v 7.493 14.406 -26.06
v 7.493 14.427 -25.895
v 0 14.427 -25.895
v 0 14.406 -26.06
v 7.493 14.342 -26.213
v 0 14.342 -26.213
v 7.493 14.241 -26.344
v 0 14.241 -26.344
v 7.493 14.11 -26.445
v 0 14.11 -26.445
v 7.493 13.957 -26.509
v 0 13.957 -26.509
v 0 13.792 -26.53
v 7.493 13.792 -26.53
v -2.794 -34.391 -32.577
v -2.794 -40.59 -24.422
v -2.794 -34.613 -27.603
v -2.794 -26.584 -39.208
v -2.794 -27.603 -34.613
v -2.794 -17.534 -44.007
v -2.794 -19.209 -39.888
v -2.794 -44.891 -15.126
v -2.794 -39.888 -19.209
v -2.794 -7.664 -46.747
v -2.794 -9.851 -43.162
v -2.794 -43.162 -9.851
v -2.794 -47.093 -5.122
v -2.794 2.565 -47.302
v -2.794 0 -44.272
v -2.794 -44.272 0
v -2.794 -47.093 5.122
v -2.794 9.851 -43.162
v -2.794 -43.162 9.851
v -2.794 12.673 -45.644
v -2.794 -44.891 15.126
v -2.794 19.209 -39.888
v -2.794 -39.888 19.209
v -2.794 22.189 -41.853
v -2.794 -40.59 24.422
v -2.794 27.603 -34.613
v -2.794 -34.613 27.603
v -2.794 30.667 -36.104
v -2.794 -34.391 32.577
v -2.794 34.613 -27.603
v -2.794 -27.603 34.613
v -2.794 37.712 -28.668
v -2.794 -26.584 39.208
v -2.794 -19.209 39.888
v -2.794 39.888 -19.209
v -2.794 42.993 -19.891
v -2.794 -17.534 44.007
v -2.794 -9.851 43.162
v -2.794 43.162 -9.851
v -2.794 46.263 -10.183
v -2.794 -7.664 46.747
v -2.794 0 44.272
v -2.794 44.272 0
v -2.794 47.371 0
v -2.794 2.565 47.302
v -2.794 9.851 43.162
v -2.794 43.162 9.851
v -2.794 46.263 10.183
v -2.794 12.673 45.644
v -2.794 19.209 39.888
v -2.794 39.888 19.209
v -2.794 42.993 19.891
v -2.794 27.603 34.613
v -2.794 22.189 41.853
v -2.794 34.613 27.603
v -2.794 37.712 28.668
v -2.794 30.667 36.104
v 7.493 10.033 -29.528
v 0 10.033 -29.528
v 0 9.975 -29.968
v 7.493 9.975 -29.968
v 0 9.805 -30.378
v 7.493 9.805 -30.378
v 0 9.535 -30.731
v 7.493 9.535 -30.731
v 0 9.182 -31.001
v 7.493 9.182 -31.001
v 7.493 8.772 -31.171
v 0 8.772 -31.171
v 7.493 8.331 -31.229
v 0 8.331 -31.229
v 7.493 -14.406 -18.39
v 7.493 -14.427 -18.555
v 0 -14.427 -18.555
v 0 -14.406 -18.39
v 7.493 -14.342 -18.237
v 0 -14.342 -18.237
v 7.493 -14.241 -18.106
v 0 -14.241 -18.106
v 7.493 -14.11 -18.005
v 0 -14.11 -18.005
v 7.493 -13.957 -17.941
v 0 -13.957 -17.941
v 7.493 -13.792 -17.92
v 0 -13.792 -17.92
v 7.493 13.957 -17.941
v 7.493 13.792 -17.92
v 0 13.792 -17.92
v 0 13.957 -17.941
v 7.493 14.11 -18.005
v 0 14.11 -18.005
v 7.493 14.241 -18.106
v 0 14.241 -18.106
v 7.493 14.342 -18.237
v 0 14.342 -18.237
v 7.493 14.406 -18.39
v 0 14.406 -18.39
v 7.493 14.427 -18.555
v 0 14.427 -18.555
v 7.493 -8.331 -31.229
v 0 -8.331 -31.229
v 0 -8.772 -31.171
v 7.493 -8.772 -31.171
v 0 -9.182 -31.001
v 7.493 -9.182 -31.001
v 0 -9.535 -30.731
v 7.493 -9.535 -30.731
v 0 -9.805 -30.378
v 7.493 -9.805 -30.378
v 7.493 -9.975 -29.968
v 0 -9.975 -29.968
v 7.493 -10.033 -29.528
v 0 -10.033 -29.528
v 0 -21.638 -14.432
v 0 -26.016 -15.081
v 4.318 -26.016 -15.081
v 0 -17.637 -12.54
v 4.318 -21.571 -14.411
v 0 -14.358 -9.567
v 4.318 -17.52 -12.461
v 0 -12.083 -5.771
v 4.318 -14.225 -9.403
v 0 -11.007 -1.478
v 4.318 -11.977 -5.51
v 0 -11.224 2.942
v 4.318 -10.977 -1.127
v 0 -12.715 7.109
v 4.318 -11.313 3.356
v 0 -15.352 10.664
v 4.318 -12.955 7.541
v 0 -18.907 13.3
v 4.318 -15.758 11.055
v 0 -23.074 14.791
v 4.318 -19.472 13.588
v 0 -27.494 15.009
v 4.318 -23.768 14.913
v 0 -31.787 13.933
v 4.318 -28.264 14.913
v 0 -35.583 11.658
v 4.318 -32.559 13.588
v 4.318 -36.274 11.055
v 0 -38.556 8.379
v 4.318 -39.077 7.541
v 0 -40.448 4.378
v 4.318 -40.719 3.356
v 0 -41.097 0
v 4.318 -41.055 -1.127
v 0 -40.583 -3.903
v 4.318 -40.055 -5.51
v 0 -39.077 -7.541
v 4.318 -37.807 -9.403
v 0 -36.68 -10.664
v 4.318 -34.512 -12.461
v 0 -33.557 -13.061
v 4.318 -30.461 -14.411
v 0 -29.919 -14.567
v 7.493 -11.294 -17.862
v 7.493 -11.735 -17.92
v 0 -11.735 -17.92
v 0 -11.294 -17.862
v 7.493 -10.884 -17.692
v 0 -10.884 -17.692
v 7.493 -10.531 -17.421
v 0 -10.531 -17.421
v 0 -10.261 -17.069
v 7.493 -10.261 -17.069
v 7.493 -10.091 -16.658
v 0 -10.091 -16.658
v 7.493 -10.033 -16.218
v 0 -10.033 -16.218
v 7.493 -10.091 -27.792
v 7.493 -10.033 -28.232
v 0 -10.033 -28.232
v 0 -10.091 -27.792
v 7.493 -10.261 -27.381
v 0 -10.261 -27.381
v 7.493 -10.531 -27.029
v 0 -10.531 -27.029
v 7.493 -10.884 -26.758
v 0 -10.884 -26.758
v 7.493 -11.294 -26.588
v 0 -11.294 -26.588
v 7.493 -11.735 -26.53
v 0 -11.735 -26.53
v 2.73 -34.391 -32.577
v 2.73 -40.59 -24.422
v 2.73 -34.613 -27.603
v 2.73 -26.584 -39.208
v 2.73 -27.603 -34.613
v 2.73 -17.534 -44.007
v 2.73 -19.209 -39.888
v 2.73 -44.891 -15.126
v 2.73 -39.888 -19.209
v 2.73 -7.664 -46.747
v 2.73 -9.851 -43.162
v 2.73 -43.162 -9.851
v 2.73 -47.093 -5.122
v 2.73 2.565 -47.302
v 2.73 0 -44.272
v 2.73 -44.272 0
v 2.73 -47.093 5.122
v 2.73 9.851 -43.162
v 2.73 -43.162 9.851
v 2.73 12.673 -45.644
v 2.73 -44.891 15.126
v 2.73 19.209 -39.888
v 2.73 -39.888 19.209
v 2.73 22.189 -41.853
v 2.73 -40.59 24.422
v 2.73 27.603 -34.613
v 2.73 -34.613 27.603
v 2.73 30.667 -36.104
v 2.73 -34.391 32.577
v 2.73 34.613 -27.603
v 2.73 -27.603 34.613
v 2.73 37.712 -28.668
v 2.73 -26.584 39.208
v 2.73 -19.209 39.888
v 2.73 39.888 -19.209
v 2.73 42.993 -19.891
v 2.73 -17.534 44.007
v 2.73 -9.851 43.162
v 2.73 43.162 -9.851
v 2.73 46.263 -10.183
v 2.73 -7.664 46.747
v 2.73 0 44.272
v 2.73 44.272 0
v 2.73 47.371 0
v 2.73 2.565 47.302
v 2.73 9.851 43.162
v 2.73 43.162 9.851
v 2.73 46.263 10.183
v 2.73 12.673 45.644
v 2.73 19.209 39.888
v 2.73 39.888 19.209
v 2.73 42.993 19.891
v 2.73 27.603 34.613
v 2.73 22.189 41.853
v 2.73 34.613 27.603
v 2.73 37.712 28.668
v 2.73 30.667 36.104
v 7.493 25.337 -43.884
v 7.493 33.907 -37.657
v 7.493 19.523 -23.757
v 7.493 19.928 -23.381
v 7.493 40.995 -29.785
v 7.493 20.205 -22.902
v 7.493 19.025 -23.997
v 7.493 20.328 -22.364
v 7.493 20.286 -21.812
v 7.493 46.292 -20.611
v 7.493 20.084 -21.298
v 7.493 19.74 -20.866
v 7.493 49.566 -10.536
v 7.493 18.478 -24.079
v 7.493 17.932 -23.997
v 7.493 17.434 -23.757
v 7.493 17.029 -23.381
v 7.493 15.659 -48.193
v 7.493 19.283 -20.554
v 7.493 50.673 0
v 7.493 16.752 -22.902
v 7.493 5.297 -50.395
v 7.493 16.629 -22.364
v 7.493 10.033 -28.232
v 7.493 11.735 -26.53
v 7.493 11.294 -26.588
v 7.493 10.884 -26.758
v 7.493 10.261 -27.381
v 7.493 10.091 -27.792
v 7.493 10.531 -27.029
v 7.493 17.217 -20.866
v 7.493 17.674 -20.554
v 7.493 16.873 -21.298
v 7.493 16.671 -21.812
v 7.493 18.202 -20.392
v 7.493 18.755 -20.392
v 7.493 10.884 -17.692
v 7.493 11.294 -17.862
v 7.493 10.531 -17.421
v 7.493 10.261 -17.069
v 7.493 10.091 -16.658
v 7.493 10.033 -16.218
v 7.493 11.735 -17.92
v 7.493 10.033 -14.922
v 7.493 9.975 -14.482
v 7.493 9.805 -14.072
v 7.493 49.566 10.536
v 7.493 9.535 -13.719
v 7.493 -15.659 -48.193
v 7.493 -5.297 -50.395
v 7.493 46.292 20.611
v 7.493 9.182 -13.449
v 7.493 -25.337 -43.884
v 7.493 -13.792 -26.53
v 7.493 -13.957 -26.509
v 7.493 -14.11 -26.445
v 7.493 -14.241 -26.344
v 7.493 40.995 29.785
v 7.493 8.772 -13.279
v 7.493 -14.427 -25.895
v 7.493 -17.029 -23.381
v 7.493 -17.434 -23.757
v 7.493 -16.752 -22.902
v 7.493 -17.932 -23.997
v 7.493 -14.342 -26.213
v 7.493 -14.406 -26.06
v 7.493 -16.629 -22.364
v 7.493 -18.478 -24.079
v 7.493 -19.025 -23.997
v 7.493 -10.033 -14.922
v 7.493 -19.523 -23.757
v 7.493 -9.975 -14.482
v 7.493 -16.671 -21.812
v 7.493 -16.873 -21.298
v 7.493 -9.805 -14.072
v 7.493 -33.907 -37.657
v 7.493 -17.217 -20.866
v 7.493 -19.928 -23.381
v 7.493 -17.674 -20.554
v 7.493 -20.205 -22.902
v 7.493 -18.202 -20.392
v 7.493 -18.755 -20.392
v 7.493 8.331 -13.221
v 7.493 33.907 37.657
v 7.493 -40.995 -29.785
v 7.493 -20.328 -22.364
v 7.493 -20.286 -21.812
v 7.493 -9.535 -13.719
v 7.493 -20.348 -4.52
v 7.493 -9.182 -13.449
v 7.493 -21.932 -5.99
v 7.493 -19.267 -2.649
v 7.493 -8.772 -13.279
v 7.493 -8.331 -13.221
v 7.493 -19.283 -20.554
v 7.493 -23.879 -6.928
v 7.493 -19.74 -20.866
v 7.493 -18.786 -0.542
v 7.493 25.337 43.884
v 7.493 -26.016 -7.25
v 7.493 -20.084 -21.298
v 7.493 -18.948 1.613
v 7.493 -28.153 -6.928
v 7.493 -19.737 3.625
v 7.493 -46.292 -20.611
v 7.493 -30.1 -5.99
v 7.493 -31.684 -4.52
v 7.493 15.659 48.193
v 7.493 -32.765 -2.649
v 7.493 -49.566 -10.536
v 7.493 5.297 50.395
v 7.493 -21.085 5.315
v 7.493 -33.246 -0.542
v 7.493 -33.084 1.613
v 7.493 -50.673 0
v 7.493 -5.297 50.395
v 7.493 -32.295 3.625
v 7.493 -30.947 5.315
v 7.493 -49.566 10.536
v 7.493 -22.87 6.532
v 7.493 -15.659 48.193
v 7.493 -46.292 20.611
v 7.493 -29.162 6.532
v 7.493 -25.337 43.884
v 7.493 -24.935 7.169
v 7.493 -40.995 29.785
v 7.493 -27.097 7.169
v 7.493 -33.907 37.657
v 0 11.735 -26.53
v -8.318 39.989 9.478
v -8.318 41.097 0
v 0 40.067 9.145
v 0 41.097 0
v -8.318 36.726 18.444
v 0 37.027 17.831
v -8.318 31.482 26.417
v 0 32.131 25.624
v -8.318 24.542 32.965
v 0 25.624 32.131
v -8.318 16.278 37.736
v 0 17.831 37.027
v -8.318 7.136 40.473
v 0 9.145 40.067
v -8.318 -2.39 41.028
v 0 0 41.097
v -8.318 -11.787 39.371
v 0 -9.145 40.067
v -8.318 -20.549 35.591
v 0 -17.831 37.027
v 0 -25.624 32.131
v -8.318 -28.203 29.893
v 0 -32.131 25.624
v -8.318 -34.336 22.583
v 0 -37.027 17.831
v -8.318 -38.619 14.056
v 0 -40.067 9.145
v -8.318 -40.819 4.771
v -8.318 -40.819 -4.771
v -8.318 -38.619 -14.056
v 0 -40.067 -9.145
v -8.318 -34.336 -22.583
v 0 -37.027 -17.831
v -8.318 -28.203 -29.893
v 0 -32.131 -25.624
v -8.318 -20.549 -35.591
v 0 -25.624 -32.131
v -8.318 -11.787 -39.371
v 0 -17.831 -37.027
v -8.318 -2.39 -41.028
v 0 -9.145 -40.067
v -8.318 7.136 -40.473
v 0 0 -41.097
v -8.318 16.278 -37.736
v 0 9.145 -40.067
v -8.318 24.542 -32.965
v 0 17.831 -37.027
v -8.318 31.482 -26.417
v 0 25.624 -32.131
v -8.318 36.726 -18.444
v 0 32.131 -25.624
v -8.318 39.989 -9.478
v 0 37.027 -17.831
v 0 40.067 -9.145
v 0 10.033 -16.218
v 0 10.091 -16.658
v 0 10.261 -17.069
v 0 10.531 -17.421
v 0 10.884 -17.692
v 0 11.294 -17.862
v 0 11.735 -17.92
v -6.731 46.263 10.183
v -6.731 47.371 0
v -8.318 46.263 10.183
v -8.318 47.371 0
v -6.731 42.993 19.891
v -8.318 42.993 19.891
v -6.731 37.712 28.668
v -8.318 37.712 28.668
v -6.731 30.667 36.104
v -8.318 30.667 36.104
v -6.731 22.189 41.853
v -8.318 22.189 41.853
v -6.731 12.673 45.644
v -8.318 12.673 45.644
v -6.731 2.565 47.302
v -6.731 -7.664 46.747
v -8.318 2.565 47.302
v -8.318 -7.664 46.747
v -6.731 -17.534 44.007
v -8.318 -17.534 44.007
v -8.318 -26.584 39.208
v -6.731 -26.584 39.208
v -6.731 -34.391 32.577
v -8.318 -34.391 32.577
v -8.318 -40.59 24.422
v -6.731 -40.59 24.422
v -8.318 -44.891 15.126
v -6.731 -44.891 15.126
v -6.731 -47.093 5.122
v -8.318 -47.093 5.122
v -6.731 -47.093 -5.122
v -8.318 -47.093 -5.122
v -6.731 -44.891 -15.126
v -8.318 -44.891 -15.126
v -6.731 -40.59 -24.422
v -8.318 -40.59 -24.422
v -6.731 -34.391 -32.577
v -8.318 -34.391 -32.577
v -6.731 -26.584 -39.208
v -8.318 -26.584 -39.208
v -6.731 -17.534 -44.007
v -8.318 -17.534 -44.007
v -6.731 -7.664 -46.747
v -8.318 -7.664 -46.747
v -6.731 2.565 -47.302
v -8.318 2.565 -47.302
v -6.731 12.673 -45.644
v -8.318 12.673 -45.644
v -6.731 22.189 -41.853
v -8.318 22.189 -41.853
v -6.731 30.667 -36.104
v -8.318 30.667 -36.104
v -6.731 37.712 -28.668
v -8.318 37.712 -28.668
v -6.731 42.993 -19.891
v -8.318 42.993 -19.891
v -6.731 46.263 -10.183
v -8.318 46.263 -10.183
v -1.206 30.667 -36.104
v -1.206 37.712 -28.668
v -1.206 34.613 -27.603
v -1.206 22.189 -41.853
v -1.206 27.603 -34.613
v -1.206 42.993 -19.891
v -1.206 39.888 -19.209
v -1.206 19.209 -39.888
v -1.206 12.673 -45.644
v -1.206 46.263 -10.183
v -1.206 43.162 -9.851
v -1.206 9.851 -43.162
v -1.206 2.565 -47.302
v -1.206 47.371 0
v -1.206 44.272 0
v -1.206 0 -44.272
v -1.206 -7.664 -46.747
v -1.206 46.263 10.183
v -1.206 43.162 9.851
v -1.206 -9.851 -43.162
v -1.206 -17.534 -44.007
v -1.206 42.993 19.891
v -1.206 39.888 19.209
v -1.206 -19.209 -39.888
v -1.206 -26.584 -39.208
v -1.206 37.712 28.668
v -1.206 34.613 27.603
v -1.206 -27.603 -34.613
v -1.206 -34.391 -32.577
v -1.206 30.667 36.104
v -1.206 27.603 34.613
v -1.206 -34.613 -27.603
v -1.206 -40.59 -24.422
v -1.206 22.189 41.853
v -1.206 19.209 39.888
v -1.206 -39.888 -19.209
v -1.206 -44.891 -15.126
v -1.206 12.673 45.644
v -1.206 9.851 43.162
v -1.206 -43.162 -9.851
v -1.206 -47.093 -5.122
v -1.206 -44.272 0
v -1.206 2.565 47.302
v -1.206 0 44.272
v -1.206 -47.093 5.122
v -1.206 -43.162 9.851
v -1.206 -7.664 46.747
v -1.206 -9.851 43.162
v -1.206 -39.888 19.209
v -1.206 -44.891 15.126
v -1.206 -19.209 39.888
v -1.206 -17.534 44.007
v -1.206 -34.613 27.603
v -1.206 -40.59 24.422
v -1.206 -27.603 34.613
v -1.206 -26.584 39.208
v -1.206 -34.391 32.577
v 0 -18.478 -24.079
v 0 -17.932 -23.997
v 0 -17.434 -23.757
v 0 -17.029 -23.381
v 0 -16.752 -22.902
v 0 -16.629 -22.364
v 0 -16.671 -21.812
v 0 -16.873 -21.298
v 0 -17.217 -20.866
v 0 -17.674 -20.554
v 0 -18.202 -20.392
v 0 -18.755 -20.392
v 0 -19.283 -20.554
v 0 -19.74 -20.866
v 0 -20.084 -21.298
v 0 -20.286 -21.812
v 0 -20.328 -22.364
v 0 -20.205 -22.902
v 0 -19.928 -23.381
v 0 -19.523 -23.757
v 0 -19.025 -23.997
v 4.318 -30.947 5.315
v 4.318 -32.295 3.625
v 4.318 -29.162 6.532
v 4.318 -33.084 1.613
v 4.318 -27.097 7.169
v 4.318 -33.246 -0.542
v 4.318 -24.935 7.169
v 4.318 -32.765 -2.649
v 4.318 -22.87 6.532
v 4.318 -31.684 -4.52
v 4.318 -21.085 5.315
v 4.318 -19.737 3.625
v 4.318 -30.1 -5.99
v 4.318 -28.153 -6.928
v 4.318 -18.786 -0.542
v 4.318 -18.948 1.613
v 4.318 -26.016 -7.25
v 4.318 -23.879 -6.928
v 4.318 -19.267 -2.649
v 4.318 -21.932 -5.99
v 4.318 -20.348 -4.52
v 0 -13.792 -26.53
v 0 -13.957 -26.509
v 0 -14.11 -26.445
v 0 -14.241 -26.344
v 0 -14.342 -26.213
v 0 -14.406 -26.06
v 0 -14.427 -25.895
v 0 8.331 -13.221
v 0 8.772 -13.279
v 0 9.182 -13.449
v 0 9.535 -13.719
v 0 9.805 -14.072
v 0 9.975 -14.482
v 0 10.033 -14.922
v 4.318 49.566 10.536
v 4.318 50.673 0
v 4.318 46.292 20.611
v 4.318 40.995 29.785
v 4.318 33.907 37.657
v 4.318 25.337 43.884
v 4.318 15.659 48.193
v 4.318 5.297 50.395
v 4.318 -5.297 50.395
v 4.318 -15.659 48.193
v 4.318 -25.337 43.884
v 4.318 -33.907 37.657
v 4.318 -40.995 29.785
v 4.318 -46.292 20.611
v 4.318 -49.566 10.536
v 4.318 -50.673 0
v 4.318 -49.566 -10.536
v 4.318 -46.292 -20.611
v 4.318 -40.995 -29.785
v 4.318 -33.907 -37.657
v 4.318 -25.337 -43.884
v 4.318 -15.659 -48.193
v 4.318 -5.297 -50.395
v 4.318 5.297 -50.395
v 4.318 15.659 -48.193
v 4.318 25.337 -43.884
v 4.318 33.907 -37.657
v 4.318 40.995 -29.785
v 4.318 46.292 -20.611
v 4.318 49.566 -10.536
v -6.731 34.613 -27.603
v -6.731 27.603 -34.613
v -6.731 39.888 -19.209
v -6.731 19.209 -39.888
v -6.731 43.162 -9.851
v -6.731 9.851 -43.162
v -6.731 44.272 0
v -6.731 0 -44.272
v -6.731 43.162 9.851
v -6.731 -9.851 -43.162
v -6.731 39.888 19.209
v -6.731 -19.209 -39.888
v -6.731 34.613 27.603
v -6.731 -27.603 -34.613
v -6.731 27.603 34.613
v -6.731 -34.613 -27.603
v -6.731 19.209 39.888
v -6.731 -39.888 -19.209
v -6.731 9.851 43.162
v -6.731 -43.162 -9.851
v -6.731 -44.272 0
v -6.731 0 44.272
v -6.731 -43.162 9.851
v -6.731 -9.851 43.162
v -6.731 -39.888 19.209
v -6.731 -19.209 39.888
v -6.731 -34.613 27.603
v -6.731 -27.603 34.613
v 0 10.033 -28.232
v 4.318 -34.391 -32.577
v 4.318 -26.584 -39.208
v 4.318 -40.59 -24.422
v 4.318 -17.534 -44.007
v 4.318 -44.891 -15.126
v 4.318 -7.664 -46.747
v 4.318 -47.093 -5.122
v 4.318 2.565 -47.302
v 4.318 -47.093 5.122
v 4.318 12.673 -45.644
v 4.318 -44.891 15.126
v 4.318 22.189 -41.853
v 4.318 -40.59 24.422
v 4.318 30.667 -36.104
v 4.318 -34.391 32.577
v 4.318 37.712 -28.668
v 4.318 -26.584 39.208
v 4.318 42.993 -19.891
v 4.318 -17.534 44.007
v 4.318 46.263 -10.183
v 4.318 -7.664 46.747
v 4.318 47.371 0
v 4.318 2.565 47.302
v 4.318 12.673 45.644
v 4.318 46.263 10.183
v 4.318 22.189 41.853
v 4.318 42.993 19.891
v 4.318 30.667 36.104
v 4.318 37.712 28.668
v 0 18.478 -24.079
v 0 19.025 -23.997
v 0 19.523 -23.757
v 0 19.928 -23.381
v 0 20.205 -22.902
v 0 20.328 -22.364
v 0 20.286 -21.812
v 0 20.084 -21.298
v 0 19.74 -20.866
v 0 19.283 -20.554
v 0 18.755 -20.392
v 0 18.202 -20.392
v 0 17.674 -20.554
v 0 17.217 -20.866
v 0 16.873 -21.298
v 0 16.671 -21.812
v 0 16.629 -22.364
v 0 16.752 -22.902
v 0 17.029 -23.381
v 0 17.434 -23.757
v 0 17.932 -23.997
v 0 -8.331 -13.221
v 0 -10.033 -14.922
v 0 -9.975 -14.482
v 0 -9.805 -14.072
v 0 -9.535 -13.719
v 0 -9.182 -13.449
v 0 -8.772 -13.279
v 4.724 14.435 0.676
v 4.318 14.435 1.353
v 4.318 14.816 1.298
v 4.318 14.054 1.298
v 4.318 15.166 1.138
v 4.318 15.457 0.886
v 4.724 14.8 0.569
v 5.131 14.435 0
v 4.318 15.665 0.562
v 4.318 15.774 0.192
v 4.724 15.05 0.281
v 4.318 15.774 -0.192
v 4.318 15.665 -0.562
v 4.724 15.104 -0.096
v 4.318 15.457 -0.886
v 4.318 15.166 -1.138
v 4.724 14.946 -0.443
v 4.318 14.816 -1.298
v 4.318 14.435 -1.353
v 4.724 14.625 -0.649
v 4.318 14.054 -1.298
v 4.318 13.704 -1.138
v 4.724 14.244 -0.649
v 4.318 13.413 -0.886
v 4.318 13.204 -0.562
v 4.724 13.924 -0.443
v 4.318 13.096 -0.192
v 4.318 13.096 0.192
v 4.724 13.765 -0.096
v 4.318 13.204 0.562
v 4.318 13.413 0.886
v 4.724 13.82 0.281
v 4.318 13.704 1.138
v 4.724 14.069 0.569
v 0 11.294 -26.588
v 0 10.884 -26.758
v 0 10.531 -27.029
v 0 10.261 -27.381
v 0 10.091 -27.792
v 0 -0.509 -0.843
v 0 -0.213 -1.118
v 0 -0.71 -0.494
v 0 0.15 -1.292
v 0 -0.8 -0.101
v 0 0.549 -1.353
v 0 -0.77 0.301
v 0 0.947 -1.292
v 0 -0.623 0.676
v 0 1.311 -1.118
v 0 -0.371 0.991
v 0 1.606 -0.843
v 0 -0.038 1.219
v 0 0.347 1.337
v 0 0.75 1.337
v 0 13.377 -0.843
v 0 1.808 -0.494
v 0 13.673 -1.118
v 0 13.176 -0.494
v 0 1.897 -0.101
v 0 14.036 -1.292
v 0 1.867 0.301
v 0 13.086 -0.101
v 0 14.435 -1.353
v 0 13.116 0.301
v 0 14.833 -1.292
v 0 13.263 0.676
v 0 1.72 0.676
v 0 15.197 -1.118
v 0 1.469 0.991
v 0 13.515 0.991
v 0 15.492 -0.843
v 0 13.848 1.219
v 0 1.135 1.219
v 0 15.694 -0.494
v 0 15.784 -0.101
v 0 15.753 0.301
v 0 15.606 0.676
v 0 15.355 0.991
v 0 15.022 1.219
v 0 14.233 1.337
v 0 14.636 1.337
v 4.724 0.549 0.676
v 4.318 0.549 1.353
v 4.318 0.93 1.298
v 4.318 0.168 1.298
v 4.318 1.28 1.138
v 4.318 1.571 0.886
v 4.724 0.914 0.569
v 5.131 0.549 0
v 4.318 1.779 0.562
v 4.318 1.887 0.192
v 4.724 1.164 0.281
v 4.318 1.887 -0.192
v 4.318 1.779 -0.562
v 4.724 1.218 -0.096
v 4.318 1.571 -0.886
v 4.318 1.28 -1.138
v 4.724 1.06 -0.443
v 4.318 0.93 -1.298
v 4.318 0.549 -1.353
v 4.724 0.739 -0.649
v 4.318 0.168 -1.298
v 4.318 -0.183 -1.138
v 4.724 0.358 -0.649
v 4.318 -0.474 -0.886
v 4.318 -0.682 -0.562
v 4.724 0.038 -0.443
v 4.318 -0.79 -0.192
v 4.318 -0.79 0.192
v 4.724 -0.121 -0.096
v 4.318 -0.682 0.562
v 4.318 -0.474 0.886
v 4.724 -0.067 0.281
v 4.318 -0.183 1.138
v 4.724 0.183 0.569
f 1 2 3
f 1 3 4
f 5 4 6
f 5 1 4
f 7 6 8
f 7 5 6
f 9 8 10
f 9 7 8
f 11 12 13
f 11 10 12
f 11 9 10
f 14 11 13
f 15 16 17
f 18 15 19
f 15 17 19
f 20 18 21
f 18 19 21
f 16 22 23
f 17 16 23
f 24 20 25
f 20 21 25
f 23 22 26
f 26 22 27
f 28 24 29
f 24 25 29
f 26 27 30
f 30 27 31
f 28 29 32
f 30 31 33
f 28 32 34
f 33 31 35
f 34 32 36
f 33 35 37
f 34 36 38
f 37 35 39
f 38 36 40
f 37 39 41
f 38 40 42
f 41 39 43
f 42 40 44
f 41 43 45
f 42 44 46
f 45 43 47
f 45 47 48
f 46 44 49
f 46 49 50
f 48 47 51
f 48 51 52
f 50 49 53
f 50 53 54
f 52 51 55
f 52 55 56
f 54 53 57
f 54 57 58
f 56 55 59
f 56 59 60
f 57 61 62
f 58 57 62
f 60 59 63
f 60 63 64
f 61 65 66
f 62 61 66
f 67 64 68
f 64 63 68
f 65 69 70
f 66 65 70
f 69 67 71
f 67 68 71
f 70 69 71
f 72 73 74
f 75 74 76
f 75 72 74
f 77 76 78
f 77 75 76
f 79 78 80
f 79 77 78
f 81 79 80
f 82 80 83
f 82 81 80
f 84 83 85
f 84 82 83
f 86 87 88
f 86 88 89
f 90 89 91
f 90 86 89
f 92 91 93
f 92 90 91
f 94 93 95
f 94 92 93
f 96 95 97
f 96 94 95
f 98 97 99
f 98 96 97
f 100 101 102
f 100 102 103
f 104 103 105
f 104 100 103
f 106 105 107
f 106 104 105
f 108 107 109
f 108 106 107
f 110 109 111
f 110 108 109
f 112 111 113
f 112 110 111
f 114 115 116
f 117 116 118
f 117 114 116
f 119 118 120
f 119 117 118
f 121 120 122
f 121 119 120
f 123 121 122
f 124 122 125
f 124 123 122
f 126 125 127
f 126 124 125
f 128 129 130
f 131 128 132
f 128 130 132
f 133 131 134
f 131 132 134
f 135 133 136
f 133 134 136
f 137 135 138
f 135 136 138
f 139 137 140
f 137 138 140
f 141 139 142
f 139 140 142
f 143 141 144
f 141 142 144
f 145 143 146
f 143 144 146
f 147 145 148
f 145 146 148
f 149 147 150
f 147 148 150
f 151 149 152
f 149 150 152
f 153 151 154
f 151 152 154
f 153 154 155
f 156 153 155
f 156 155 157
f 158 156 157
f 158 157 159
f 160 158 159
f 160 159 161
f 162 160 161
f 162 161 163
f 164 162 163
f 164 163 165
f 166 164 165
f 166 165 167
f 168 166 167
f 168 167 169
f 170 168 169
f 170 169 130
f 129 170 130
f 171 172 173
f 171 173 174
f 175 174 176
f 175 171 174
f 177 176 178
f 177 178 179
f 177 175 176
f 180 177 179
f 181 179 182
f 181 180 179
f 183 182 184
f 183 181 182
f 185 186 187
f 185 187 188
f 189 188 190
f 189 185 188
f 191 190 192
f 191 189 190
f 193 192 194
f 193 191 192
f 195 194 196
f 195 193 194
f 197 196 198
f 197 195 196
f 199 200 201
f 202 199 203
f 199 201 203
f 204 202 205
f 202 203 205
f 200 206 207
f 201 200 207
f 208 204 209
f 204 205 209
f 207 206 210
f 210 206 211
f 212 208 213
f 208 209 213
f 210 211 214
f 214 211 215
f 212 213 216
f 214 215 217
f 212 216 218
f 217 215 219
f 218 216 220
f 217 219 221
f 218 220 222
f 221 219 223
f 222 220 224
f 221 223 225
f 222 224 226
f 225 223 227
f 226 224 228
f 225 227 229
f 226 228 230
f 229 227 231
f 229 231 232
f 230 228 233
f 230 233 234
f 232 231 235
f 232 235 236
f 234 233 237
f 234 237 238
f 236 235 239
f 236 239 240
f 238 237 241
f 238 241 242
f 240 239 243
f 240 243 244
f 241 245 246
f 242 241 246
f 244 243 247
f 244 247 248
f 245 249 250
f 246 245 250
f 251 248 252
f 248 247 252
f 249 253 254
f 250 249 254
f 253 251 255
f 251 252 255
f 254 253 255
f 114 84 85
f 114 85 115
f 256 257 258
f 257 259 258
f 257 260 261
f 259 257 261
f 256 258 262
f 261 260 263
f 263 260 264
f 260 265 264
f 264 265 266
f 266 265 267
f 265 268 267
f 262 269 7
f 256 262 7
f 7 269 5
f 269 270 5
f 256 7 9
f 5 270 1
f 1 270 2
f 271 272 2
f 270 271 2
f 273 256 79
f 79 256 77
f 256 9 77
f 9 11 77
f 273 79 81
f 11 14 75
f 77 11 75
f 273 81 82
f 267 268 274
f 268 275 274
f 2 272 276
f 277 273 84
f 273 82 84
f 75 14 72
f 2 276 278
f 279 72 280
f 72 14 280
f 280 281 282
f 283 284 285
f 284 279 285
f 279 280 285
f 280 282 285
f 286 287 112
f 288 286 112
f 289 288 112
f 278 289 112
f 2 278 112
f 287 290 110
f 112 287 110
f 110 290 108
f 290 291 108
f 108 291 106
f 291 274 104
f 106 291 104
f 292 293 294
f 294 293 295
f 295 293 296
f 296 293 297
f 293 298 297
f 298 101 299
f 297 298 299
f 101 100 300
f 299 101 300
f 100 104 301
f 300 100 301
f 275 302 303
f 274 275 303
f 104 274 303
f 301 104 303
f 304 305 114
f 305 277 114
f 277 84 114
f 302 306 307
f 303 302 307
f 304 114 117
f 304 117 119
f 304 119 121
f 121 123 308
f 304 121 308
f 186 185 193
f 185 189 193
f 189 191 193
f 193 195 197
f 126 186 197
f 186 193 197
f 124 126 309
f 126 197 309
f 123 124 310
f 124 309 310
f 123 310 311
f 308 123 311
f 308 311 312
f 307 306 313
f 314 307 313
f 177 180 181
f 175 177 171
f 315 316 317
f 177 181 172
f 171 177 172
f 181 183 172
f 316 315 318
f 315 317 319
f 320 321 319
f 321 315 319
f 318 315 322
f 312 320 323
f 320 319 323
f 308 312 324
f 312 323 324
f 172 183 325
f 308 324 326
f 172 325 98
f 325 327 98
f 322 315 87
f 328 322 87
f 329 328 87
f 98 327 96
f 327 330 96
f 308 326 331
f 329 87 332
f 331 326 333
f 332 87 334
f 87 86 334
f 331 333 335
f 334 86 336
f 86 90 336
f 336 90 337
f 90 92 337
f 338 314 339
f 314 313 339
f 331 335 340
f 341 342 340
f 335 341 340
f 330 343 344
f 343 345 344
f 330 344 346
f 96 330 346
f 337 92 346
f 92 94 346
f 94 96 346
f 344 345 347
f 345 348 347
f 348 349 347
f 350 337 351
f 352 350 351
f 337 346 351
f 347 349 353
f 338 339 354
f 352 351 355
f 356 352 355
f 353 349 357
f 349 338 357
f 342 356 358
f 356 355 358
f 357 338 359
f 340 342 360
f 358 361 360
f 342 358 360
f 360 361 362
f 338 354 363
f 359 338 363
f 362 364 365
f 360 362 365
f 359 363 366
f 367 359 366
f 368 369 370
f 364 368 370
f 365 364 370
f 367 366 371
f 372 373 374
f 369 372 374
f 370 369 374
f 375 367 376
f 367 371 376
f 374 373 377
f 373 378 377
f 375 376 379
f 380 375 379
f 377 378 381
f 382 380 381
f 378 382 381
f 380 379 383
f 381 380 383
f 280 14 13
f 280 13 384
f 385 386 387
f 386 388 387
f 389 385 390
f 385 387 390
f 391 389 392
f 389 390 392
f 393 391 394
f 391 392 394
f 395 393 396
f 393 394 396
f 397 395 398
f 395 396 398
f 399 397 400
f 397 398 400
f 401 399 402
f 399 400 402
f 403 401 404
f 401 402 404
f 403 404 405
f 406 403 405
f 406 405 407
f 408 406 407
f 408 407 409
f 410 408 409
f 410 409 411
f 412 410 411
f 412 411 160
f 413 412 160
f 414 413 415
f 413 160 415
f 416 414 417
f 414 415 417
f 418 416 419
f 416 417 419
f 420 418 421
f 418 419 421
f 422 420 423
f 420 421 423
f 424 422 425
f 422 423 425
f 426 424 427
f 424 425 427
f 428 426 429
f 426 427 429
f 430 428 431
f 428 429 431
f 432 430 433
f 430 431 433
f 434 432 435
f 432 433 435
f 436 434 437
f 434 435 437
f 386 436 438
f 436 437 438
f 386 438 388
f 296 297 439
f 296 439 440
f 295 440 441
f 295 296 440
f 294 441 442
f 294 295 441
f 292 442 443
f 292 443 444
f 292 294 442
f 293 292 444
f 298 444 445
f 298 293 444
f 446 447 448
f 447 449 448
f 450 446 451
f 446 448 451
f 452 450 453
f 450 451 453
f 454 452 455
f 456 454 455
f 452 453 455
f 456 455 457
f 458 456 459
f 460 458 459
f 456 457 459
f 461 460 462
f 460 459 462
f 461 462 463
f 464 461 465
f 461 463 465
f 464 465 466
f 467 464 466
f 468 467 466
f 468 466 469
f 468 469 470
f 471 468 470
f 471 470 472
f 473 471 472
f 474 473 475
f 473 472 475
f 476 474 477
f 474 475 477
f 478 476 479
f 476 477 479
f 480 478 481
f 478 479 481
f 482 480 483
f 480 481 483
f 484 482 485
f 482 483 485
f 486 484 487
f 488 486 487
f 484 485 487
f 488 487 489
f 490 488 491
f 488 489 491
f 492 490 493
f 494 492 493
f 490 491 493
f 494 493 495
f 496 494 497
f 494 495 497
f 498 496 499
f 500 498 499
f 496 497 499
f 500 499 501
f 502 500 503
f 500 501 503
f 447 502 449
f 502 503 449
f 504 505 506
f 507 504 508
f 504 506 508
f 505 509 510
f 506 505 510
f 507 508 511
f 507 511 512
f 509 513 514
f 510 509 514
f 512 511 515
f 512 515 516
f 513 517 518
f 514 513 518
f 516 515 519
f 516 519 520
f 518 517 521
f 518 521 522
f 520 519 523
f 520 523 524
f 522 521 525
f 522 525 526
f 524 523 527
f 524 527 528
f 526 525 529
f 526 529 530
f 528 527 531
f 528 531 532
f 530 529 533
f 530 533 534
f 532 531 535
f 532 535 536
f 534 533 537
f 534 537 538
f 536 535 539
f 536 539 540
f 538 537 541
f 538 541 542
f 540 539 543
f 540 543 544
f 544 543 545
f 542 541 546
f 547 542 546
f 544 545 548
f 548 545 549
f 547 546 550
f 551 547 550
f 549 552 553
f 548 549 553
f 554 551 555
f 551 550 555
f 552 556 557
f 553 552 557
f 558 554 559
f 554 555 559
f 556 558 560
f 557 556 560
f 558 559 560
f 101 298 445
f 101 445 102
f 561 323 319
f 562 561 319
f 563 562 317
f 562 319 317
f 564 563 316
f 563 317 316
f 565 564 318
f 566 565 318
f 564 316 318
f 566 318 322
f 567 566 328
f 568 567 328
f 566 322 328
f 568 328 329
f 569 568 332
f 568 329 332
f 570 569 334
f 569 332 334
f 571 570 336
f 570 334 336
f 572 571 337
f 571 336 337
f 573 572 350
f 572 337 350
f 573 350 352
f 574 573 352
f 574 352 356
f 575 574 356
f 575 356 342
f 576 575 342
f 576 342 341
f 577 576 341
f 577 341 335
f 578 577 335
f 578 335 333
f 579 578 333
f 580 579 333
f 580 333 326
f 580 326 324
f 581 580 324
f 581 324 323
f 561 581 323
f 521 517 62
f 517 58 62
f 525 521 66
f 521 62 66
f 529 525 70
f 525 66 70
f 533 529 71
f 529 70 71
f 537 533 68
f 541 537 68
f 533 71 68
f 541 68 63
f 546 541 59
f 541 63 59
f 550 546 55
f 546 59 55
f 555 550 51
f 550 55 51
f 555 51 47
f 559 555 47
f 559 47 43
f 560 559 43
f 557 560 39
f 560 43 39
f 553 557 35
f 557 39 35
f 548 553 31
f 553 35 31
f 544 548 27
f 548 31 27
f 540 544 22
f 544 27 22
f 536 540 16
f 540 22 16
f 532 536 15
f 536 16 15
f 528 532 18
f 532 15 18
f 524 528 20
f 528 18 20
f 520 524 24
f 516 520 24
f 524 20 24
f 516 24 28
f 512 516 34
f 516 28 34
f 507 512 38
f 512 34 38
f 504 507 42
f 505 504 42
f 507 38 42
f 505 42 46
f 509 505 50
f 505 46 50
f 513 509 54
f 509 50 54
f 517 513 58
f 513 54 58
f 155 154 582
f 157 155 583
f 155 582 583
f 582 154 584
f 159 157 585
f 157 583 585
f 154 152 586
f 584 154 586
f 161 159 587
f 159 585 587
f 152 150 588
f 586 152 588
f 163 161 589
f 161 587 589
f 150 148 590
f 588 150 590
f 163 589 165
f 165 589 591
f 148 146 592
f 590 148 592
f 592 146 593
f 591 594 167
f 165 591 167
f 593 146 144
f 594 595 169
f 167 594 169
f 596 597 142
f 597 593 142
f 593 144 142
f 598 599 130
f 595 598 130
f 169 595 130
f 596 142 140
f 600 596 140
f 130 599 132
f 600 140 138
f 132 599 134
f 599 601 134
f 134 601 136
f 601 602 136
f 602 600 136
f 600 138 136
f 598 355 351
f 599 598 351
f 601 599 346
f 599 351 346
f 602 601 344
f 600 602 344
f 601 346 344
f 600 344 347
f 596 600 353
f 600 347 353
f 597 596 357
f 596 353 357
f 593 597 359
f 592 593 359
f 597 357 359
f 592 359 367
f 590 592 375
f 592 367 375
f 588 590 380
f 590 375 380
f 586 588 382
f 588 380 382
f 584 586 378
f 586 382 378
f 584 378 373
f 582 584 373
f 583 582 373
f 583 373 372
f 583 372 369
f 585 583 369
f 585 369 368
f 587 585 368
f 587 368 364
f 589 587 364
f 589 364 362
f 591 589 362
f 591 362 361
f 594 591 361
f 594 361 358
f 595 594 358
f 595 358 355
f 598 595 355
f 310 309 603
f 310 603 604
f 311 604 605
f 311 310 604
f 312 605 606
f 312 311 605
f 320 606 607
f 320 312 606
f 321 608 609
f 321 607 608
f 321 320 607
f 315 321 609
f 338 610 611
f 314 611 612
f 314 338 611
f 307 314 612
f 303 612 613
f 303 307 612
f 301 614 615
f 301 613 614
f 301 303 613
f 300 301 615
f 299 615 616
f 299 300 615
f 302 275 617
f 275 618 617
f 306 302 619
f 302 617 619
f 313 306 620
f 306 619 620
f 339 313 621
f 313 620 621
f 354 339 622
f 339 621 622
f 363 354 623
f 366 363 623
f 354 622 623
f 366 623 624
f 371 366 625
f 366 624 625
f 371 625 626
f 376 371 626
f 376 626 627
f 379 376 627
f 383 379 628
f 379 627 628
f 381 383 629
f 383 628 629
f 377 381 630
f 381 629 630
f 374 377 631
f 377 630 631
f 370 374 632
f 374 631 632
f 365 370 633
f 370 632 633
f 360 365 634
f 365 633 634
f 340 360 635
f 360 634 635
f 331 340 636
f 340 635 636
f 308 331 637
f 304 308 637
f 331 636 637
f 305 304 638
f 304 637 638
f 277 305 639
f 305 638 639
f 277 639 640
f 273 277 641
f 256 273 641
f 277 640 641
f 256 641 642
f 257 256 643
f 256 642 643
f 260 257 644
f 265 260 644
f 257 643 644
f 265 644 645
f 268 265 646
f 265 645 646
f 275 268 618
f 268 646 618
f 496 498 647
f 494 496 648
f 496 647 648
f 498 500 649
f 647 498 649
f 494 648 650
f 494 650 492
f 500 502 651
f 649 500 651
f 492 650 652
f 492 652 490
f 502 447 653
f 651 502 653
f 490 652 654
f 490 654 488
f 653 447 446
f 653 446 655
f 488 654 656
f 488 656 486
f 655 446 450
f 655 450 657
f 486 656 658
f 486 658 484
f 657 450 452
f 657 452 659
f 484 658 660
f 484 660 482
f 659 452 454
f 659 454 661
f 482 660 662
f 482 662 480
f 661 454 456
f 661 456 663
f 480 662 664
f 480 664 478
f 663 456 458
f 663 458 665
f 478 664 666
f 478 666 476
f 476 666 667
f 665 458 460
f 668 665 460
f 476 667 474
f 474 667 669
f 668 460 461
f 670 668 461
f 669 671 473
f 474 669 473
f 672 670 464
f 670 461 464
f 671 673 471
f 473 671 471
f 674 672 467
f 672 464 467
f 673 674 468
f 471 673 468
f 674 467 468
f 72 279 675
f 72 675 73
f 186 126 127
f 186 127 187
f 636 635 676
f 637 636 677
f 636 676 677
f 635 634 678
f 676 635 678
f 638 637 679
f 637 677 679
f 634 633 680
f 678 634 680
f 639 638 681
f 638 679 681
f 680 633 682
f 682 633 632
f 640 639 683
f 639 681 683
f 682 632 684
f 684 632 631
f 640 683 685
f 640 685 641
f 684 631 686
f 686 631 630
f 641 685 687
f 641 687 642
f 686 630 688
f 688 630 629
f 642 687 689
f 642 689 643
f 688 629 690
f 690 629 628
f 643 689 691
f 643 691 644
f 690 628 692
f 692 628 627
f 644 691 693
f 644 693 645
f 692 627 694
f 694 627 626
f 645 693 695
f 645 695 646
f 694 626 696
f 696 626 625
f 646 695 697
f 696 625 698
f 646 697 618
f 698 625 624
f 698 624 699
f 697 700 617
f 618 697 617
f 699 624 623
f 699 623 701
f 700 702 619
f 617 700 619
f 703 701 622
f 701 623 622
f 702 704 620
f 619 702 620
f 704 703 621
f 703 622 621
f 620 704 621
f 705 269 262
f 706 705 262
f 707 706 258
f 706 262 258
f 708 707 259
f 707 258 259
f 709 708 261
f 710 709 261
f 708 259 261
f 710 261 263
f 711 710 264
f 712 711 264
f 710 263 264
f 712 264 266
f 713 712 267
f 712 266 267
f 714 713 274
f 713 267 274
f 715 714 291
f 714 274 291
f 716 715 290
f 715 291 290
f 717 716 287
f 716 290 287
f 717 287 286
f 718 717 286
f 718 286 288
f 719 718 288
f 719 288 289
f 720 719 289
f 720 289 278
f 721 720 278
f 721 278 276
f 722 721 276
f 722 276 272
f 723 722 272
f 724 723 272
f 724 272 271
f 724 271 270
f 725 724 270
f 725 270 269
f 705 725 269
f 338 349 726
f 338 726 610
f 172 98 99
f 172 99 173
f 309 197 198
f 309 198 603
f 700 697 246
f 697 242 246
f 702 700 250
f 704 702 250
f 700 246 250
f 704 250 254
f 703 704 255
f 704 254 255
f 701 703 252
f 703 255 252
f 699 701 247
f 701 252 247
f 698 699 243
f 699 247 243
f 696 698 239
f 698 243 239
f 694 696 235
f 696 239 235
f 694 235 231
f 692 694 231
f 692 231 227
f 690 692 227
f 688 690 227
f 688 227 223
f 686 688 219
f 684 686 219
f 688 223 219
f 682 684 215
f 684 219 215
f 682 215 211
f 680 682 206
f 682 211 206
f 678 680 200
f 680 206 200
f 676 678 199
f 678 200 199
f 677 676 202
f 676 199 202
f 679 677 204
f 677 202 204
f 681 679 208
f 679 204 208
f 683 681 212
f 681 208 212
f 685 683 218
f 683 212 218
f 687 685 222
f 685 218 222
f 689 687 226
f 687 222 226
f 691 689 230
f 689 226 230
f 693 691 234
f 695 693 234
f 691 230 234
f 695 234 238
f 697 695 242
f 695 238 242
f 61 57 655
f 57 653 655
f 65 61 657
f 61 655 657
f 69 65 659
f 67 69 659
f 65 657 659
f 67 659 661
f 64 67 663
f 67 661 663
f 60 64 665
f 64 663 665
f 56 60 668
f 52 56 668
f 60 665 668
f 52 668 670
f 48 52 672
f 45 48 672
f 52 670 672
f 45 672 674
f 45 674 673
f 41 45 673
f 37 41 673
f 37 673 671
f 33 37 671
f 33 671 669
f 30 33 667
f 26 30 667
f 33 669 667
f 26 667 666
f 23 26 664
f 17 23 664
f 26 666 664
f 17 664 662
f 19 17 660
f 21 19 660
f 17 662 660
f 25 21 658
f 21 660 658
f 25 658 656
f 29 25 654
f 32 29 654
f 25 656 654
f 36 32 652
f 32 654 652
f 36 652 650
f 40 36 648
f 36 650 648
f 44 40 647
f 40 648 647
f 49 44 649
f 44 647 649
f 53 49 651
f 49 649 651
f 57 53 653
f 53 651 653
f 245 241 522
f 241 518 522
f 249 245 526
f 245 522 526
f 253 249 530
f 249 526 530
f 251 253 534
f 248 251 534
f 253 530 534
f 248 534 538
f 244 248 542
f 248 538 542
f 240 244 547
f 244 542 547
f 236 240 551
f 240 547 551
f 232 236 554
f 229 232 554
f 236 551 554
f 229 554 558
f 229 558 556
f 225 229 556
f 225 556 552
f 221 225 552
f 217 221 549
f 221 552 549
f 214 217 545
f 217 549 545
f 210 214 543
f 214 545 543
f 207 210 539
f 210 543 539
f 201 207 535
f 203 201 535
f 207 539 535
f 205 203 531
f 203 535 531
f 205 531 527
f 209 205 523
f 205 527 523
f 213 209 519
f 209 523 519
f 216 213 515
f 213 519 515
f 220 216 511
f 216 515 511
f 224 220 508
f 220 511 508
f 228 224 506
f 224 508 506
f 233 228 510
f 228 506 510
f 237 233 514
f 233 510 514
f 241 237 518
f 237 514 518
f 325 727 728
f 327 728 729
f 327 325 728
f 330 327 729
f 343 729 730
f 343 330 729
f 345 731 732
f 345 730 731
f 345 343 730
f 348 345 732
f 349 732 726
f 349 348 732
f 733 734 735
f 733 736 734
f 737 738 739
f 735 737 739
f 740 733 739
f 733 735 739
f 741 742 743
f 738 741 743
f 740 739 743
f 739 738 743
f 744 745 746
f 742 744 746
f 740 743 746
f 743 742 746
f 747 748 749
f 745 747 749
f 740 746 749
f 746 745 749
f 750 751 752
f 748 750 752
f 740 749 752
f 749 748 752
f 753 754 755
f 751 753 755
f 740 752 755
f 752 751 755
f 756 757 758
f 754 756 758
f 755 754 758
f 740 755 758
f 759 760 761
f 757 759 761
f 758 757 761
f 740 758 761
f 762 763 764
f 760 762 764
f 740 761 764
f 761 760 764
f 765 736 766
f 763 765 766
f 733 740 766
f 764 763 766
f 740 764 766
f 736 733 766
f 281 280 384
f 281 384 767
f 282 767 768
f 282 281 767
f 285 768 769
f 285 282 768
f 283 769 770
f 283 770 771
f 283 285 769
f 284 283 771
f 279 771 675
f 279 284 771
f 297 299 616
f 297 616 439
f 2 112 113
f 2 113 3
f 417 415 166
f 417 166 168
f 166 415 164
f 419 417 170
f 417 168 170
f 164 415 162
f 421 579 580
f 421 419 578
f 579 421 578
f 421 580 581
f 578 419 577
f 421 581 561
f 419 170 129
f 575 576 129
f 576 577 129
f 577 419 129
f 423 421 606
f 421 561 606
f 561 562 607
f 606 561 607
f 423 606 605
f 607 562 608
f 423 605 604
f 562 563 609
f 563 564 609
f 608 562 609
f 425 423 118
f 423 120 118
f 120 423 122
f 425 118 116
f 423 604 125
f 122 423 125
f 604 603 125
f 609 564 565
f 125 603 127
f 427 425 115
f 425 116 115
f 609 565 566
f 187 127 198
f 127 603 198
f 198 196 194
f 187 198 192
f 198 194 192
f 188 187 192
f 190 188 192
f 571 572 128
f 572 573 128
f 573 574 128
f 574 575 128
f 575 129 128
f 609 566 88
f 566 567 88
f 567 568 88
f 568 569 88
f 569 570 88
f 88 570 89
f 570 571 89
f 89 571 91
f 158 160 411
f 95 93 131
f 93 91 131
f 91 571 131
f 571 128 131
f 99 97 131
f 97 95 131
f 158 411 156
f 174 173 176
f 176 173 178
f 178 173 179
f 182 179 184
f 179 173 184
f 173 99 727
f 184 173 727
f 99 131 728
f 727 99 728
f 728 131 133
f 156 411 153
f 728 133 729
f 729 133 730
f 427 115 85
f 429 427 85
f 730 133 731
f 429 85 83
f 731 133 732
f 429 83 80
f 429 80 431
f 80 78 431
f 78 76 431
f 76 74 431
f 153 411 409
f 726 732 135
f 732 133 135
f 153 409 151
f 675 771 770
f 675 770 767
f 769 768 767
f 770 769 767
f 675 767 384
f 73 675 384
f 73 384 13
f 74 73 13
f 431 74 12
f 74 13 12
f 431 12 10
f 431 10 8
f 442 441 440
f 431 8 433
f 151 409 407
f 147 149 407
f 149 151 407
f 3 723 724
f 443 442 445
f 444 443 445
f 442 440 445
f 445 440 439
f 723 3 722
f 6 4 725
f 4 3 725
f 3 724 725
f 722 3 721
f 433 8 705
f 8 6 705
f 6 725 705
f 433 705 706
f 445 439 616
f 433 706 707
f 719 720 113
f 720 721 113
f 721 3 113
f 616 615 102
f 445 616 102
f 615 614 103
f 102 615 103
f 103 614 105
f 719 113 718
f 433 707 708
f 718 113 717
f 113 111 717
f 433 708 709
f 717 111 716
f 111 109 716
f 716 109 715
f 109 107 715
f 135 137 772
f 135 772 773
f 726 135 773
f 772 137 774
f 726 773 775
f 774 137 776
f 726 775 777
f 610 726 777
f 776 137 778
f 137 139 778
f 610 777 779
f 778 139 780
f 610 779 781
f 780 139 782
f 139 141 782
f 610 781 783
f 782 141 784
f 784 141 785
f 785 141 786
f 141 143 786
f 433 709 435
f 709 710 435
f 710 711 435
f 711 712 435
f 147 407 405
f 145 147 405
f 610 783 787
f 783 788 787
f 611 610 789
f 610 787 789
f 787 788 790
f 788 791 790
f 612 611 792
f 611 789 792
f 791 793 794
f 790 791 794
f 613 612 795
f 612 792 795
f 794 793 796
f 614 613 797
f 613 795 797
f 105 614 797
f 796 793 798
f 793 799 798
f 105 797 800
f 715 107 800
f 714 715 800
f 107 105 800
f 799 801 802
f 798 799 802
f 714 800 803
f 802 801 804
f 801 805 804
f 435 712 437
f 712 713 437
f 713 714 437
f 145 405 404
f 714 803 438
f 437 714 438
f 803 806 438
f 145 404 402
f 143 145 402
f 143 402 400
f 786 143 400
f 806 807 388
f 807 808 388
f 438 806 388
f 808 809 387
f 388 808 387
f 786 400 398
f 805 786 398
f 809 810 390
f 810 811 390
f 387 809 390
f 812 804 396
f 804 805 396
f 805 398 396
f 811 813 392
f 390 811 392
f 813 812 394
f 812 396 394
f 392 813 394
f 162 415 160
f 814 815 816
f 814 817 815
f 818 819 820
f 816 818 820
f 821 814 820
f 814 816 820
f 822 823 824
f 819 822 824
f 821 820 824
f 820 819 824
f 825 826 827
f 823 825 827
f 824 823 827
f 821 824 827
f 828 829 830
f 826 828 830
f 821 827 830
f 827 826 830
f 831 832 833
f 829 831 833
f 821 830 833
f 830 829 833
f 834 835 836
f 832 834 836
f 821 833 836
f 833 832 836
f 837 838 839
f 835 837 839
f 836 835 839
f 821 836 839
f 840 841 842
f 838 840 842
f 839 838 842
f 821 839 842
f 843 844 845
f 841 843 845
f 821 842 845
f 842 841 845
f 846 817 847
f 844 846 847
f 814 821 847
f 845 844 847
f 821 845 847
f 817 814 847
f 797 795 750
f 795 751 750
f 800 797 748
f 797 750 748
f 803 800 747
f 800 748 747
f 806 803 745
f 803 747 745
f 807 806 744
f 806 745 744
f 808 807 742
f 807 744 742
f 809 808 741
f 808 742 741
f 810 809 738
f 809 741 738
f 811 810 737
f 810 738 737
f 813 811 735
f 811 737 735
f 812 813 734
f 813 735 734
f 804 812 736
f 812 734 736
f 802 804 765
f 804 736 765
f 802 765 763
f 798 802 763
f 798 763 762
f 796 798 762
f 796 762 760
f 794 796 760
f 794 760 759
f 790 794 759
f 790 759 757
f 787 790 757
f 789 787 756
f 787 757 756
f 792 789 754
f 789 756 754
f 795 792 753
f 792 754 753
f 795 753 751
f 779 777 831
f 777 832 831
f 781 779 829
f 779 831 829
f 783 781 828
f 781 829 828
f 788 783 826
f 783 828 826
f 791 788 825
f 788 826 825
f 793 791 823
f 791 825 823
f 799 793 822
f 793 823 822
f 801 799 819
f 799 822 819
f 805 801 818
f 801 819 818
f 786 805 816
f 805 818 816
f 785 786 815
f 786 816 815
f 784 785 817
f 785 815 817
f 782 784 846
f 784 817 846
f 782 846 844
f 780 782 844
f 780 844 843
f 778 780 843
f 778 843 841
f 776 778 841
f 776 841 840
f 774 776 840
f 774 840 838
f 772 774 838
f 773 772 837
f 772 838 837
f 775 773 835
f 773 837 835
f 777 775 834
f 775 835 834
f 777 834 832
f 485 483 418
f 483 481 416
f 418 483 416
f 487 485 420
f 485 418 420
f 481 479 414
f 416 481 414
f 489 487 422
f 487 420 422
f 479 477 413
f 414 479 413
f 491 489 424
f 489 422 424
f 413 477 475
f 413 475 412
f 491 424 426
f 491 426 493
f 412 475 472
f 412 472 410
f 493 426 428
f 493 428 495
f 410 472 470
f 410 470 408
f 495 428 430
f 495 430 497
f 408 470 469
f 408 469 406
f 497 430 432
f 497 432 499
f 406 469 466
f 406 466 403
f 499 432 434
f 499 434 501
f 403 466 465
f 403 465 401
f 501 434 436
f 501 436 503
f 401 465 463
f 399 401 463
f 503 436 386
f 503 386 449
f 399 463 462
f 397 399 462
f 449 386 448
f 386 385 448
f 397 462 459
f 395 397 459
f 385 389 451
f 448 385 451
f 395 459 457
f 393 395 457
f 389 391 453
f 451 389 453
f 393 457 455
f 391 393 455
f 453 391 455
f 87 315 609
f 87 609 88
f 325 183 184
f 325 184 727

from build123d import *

# Parameters (mm, degrees)
SKETCH6_R                 = 1.8542
CUT_EXTRUDE1_DEPTH        = 16.8115
F_6_32_TAPPED_HOLE1_D     = 2.7051
F_6_32_TAPPED_HOLE1_DEPTH = 4.318
F_6_32_TAPPED_HOLE1_TIP   = 0.81269403
CUT_EXTRUDE3_START        = -3.175
SKETCH12_R                = 15.08125
CUT_EXTRUDE3_DEPTH        = 13.6365
M16X1_5_TAPPED_HOLE1_D    = 14.5


with BuildPart() as part:
    # Sketch1 → Revolve1 (revolve)
    with BuildSketch(Plane.XY):
        Polygon((4.318, 50.673), (4.318, 47.371), (2.7305, 47.371), (2.7305, 44.2722), (-1.2065, 44.2722), (-1.2065, 47.371), (-2.794, 47.371), (-2.794, 44.2722), (-6.731, 44.2722), (-6.731, 47.371), (-8.3185, 47.371), (-8.3185, 41.0972), (0, 41.0972), (0, 0), (7.493, 0), (7.493, 50.673), align=None)
    revolve(axis=Axis((0, 0, 0), (1, 0, 0)))

    # Sketch6 → Cut-Extrude1 (cut, through all)
    with BuildSketch(Plane(origin=(7.493, 0, 0), x_dir=(0, 0, -1), z_dir=(1, 0, 0))):
        with Locations((22.225, 18.4785)):
            Circle(SKETCH6_R)
        with Locations((22.225, -18.4785)):
            Circle(SKETCH6_R)
        with BuildLine():
            Line((18.5547, 14.4272), (25.8953, 14.4272))
            ThreePointArc((25.8953, 14.4272), (26.344312806, 14.241212806), (26.5303, 13.7922))
            Line((26.5303, 13.7922), (26.5303, 11.7348))
            ThreePointArc((26.5303, 11.7348), (27.02874568, 10.53144568), (28.2321, 10.033))
            Line((28.2321, 10.033), (29.5275, 10.033))
            ThreePointArc((29.5275, 10.033), (30.73085432, 9.53455432), (31.2293, 8.3312))
            Line((31.2293, 8.3312), (31.2293, -8.3312))
            ThreePointArc((31.2293, -8.3312), (30.73085432, -9.53455432), (29.5275, -10.033))
            Line((29.5275, -10.033), (28.2321, -10.033))
            ThreePointArc((28.2321, -10.033), (27.02874568, -10.53144568), (26.5303, -11.7348))
            Line((26.5303, -11.7348), (26.5303, -13.7922))
            ThreePointArc((26.5303, -13.7922), (26.344312806, -14.241212806), (25.8953, -14.4272))
            Line((25.8953, -14.4272), (18.5547, -14.4272))
            ThreePointArc((18.5547, -14.4272), (18.105687194, -14.241212806), (17.9197, -13.7922))
            Line((17.9197, -13.7922), (17.9197, -11.7348))
            ThreePointArc((17.9197, -11.7348), (17.42125432, -10.53144568), (16.2179, -10.033))
            Line((16.2179, -10.033), (14.9225, -10.033))
            ThreePointArc((14.9225, -10.033), (13.71914568, -9.53455432), (13.2207, -8.3312))
            Line((13.2207, -8.3312), (13.2207, 8.3312))
            ThreePointArc((13.2207, 8.3312), (13.71914568, 9.53455432), (14.9225, 10.033))
            Line((14.9225, 10.033), (16.2179, 10.033))
            ThreePointArc((16.2179, 10.033), (17.42125432, 10.53144568), (17.9197, 11.7348))
            Line((17.9197, 11.7348), (17.9197, 13.7922))
            ThreePointArc((17.9197, 13.7922), (18.105687194, 14.241212806), (18.5547, 14.4272))
        make_face()
    extrude(amount=-CUT_EXTRUDE1_DEPTH, mode=Mode.SUBTRACT)

    # #6-32 Tapped Hole1
    with Locations(Plane.ZY):
        with Locations((0, 14.43482), (0, 0.54864)):
            Hole(F_6_32_TAPPED_HOLE1_D / 2, depth=F_6_32_TAPPED_HOLE1_DEPTH)
            with Locations((0, 0, -(F_6_32_TAPPED_HOLE1_DEPTH + F_6_32_TAPPED_HOLE1_TIP / 2))):  # 118° drill point
                Cone(0, F_6_32_TAPPED_HOLE1_D / 2, F_6_32_TAPPED_HOLE1_TIP, mode=Mode.SUBTRACT)

    # Sketch12 → Cut-Extrude3 (cut, through all)
    with BuildSketch(Plane(origin=(7.493, 0, 0), x_dir=(0, 0, -1), z_dir=(1, 0, 0)).offset(CUT_EXTRUDE3_START)):
        with Locations((0, -26.01595)):
            Circle(SKETCH12_R)
    extrude(amount=-CUT_EXTRUDE3_DEPTH, mode=Mode.SUBTRACT)

    # M16x1.5 Tapped Hole1 (through all)
    with Locations(Plane.ZY.offset(-4.318)):
        with Locations((0, -26.01595)):
            Hole(M16X1_5_TAPPED_HOLE1_D / 2)


solid = part.part
